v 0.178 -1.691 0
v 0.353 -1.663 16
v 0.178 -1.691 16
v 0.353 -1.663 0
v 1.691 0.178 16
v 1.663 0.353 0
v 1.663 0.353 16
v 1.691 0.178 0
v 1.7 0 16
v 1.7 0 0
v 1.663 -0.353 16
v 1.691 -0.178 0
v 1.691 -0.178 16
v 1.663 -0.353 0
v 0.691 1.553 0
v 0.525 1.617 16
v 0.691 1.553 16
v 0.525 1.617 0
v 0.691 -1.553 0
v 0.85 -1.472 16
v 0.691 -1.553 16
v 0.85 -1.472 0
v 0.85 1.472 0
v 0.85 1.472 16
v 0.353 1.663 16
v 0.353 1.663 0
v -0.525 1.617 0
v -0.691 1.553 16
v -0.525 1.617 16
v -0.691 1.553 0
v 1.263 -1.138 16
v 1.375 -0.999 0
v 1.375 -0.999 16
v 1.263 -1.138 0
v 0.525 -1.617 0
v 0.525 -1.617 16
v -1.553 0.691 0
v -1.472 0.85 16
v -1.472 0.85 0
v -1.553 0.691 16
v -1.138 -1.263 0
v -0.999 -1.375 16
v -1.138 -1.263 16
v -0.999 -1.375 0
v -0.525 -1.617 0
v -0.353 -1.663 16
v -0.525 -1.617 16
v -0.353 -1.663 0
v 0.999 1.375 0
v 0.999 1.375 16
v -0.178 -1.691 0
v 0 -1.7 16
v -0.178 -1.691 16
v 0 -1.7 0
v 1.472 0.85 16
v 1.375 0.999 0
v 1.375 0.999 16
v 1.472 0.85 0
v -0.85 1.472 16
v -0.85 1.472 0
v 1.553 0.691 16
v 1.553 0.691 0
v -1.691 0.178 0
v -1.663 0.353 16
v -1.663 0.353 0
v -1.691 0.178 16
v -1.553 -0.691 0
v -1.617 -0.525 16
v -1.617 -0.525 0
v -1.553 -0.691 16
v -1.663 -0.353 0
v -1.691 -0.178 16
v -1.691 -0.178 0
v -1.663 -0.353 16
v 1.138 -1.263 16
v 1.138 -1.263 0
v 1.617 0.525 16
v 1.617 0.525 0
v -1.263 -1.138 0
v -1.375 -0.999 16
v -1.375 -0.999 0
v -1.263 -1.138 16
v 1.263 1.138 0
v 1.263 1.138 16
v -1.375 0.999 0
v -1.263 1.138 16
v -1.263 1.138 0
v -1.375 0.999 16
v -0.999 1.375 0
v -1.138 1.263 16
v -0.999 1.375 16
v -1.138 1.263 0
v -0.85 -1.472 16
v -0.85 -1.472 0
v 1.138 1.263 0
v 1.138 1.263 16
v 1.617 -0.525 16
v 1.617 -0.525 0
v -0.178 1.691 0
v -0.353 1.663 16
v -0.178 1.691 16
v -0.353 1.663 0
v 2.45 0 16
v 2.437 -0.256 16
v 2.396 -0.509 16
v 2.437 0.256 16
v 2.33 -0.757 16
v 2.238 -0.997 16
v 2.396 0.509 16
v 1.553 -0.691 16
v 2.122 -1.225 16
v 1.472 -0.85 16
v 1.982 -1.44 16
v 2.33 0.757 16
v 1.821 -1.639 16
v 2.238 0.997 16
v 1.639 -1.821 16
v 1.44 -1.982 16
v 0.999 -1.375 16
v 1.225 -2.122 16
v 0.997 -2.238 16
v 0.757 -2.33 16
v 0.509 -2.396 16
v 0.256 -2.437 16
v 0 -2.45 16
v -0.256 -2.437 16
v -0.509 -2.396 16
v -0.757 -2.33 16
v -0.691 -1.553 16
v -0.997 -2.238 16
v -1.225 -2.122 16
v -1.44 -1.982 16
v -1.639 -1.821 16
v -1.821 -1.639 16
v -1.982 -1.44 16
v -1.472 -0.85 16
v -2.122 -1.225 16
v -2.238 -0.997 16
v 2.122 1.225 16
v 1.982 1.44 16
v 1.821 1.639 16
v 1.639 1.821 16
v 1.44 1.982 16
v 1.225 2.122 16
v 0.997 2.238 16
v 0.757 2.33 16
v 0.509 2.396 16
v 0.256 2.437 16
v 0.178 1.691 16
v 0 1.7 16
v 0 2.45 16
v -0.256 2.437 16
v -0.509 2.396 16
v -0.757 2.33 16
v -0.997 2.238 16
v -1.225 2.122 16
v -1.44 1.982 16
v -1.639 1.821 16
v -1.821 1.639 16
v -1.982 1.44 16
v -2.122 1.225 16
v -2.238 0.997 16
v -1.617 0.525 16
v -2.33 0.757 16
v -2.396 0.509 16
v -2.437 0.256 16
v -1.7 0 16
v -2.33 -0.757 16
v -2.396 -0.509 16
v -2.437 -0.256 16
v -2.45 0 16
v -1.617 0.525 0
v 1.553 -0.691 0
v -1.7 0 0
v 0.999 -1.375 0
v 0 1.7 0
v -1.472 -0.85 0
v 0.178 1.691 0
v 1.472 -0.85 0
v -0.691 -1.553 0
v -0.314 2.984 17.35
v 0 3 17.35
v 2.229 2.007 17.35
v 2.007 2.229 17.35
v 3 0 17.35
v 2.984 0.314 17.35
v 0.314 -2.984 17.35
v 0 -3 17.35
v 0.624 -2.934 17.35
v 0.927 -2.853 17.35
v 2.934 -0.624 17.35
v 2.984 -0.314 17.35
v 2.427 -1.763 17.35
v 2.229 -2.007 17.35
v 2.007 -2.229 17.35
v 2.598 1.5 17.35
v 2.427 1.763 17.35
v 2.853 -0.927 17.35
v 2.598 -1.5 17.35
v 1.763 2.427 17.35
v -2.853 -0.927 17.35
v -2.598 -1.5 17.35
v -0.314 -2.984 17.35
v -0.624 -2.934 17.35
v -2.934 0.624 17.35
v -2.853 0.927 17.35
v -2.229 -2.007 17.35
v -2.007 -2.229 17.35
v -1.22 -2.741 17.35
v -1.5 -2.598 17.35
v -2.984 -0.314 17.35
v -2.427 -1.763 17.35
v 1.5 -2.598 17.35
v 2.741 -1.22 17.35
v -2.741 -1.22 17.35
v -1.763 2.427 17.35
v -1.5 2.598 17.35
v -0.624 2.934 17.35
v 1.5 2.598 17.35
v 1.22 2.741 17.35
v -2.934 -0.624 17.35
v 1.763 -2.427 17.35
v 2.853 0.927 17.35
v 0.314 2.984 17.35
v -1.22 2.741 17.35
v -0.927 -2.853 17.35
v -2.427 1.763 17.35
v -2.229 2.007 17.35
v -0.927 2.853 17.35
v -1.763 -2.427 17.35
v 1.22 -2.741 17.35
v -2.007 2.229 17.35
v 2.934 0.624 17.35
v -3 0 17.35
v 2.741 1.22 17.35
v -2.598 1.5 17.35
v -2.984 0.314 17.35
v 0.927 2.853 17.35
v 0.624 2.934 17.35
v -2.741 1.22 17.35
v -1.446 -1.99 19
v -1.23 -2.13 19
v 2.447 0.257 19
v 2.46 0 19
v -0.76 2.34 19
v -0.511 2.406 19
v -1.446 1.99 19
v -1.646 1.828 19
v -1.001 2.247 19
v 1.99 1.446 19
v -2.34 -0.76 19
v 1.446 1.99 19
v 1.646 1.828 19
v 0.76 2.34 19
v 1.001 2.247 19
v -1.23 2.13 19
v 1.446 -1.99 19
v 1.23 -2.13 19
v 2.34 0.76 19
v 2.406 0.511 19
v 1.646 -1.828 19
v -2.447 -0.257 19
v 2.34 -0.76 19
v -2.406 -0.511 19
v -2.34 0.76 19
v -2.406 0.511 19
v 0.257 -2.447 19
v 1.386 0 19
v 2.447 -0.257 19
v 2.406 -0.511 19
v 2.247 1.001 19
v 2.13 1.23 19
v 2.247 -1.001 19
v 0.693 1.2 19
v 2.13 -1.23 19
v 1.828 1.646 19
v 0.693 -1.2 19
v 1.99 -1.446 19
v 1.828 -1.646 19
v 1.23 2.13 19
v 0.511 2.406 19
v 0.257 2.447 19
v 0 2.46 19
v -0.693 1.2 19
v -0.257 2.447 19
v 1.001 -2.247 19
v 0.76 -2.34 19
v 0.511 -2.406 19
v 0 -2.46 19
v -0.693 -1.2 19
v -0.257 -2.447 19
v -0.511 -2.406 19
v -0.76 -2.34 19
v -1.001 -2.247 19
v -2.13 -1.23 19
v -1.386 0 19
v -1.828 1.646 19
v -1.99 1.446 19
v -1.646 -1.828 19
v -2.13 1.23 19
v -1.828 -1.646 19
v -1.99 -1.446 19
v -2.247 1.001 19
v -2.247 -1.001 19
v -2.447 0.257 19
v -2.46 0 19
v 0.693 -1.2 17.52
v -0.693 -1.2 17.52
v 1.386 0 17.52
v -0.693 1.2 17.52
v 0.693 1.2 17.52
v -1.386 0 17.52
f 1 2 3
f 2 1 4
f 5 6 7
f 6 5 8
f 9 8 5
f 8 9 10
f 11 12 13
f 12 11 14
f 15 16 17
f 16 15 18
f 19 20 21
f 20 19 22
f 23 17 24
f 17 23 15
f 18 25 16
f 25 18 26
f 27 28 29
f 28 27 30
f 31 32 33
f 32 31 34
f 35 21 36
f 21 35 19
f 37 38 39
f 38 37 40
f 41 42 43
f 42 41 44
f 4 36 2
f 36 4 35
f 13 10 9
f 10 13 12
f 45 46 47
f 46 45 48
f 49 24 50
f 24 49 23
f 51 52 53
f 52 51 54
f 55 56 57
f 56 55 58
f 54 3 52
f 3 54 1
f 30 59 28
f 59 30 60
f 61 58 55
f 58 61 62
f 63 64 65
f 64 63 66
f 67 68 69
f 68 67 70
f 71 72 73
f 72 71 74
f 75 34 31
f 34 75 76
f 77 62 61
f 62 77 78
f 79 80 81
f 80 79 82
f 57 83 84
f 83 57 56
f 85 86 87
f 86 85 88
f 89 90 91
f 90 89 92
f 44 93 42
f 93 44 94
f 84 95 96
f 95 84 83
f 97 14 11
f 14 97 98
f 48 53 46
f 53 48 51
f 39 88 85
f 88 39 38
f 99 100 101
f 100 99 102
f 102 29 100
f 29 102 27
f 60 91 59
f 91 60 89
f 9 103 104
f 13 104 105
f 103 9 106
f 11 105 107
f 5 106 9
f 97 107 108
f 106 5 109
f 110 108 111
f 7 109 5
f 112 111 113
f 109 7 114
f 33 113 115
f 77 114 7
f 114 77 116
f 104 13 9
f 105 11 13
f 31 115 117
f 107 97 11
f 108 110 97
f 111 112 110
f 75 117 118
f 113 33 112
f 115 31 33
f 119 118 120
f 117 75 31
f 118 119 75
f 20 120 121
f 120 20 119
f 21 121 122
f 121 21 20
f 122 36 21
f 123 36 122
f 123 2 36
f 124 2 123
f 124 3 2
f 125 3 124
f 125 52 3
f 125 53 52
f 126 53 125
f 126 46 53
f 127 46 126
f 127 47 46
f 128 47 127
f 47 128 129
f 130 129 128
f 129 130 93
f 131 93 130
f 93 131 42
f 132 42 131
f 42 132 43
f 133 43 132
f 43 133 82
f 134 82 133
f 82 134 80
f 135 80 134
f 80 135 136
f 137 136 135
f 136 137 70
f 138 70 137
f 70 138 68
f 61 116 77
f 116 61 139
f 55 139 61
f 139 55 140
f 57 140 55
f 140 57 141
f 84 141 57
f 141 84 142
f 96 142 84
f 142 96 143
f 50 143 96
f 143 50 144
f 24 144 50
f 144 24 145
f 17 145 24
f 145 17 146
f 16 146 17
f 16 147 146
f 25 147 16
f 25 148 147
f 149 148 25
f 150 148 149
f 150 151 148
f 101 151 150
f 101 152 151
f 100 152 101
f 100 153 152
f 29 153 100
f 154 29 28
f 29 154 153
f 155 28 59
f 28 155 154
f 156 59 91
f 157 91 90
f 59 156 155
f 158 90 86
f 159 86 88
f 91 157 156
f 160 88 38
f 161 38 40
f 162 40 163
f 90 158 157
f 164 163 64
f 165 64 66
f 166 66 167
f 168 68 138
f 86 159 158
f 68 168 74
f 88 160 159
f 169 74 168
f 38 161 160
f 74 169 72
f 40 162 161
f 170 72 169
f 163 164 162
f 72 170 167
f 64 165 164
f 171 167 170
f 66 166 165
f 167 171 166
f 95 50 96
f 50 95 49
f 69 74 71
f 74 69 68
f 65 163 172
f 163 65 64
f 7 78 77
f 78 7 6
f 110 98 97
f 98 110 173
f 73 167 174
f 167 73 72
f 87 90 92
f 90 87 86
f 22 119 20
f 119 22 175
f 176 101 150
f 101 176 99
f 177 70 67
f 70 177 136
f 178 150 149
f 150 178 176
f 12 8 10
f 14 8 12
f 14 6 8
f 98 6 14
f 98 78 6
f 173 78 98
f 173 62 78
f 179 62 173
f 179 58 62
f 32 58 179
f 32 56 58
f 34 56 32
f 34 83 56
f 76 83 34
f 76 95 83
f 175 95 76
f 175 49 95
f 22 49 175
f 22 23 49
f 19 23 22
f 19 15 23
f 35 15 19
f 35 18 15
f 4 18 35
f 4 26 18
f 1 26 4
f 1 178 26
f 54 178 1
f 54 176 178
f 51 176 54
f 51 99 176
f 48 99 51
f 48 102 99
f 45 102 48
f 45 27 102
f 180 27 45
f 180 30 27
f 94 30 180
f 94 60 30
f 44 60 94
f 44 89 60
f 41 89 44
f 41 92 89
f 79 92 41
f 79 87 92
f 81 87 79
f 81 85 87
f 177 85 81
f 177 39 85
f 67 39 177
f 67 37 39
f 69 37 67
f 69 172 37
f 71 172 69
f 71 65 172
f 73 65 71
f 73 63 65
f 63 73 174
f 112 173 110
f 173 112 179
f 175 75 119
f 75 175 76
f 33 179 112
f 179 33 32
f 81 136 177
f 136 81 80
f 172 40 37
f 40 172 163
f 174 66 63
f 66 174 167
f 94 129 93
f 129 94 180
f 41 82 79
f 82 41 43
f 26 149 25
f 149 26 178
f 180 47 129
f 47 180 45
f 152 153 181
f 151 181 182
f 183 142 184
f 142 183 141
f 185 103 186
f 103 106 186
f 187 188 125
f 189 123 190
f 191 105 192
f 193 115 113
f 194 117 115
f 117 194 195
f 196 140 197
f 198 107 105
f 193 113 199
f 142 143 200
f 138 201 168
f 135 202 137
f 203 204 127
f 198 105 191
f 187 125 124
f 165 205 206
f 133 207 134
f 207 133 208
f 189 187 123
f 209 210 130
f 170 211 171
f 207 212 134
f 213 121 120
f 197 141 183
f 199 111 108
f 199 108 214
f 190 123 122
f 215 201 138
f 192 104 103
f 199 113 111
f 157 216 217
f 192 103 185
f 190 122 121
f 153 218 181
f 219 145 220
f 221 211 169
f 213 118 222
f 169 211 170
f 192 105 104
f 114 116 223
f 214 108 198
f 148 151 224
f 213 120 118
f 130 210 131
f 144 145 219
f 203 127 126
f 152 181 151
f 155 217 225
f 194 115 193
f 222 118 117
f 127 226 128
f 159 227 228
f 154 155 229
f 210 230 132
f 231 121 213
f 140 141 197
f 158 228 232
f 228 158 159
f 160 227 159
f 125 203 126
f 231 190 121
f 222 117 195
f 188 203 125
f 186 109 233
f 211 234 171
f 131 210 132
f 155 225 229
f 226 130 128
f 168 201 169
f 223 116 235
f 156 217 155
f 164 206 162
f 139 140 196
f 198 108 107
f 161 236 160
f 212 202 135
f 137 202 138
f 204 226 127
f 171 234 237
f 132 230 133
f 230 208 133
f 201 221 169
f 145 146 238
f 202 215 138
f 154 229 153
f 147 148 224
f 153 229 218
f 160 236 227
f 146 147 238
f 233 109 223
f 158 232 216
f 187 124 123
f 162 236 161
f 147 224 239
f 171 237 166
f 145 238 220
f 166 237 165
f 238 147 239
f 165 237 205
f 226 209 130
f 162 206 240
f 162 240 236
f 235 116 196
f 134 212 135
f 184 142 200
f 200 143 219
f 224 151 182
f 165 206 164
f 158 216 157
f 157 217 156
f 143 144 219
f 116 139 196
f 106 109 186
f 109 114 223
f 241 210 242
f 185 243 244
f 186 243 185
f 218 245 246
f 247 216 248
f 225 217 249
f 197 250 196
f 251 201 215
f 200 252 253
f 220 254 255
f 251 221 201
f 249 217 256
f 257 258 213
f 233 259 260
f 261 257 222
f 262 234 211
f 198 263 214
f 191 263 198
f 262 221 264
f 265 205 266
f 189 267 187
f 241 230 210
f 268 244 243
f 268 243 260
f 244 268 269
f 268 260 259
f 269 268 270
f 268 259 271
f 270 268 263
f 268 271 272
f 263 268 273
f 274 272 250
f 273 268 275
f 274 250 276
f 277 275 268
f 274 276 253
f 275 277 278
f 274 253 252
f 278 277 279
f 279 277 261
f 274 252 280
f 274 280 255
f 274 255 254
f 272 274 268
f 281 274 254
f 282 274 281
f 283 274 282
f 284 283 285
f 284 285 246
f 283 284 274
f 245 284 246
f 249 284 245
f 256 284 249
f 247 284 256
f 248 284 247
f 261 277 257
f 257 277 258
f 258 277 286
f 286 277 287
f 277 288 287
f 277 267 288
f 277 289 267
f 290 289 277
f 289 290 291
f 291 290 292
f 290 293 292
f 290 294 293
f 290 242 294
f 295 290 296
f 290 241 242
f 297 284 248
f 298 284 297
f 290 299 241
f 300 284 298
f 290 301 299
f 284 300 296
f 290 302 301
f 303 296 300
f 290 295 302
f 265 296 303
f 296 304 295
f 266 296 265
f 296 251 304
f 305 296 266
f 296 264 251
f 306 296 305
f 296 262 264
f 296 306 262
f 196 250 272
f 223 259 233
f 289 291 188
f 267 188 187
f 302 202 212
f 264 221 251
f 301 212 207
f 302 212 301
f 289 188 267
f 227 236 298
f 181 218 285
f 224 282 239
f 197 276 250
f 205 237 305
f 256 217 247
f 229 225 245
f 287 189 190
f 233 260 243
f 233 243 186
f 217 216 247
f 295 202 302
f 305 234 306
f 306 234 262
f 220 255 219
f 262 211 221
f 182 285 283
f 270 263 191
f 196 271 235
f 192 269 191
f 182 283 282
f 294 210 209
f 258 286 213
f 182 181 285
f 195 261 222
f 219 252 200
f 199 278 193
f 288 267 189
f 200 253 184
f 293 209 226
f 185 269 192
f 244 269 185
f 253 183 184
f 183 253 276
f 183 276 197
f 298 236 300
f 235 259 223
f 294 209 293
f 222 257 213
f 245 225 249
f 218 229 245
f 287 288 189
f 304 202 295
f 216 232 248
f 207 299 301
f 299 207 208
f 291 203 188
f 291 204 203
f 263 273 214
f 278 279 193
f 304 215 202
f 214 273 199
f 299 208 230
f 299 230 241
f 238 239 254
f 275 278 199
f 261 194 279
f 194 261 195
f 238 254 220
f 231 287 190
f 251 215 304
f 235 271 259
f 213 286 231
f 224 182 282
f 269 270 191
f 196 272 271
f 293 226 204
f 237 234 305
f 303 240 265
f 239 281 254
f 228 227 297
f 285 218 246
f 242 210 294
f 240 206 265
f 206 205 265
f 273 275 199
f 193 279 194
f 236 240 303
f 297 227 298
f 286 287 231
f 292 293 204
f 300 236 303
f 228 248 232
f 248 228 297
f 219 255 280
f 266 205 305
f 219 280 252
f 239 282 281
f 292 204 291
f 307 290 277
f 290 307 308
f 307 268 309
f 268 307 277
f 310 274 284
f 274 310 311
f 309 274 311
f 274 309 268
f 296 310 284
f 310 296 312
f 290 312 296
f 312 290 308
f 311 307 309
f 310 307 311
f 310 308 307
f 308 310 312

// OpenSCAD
// Low-profile button-head screw.
$fn = 60;
eps = 0.02;
shaft_d = 3.4;
head_d = 6;
head_h = 3;
shaft_l = 16;
socket_flat = head_d * 0.40;
difference() {
    union() {
        cylinder(d = shaft_d, h = shaft_l);
        translate([0, 0, shaft_l]) cylinder(d1 = shaft_d + 1.5, d2 = head_d, h = head_h * 0.45);
        translate([0, 0, shaft_l + head_h * 0.45]) cylinder(d1 = head_d, d2 = head_d * 0.82, h = head_h * 0.55);
    }
    translate([0, 0, shaft_l + head_h - head_h * 0.5 + eps])
        cylinder(d = socket_flat / cos(30), h = head_h * 0.5 + eps, $fn = 6);
}
